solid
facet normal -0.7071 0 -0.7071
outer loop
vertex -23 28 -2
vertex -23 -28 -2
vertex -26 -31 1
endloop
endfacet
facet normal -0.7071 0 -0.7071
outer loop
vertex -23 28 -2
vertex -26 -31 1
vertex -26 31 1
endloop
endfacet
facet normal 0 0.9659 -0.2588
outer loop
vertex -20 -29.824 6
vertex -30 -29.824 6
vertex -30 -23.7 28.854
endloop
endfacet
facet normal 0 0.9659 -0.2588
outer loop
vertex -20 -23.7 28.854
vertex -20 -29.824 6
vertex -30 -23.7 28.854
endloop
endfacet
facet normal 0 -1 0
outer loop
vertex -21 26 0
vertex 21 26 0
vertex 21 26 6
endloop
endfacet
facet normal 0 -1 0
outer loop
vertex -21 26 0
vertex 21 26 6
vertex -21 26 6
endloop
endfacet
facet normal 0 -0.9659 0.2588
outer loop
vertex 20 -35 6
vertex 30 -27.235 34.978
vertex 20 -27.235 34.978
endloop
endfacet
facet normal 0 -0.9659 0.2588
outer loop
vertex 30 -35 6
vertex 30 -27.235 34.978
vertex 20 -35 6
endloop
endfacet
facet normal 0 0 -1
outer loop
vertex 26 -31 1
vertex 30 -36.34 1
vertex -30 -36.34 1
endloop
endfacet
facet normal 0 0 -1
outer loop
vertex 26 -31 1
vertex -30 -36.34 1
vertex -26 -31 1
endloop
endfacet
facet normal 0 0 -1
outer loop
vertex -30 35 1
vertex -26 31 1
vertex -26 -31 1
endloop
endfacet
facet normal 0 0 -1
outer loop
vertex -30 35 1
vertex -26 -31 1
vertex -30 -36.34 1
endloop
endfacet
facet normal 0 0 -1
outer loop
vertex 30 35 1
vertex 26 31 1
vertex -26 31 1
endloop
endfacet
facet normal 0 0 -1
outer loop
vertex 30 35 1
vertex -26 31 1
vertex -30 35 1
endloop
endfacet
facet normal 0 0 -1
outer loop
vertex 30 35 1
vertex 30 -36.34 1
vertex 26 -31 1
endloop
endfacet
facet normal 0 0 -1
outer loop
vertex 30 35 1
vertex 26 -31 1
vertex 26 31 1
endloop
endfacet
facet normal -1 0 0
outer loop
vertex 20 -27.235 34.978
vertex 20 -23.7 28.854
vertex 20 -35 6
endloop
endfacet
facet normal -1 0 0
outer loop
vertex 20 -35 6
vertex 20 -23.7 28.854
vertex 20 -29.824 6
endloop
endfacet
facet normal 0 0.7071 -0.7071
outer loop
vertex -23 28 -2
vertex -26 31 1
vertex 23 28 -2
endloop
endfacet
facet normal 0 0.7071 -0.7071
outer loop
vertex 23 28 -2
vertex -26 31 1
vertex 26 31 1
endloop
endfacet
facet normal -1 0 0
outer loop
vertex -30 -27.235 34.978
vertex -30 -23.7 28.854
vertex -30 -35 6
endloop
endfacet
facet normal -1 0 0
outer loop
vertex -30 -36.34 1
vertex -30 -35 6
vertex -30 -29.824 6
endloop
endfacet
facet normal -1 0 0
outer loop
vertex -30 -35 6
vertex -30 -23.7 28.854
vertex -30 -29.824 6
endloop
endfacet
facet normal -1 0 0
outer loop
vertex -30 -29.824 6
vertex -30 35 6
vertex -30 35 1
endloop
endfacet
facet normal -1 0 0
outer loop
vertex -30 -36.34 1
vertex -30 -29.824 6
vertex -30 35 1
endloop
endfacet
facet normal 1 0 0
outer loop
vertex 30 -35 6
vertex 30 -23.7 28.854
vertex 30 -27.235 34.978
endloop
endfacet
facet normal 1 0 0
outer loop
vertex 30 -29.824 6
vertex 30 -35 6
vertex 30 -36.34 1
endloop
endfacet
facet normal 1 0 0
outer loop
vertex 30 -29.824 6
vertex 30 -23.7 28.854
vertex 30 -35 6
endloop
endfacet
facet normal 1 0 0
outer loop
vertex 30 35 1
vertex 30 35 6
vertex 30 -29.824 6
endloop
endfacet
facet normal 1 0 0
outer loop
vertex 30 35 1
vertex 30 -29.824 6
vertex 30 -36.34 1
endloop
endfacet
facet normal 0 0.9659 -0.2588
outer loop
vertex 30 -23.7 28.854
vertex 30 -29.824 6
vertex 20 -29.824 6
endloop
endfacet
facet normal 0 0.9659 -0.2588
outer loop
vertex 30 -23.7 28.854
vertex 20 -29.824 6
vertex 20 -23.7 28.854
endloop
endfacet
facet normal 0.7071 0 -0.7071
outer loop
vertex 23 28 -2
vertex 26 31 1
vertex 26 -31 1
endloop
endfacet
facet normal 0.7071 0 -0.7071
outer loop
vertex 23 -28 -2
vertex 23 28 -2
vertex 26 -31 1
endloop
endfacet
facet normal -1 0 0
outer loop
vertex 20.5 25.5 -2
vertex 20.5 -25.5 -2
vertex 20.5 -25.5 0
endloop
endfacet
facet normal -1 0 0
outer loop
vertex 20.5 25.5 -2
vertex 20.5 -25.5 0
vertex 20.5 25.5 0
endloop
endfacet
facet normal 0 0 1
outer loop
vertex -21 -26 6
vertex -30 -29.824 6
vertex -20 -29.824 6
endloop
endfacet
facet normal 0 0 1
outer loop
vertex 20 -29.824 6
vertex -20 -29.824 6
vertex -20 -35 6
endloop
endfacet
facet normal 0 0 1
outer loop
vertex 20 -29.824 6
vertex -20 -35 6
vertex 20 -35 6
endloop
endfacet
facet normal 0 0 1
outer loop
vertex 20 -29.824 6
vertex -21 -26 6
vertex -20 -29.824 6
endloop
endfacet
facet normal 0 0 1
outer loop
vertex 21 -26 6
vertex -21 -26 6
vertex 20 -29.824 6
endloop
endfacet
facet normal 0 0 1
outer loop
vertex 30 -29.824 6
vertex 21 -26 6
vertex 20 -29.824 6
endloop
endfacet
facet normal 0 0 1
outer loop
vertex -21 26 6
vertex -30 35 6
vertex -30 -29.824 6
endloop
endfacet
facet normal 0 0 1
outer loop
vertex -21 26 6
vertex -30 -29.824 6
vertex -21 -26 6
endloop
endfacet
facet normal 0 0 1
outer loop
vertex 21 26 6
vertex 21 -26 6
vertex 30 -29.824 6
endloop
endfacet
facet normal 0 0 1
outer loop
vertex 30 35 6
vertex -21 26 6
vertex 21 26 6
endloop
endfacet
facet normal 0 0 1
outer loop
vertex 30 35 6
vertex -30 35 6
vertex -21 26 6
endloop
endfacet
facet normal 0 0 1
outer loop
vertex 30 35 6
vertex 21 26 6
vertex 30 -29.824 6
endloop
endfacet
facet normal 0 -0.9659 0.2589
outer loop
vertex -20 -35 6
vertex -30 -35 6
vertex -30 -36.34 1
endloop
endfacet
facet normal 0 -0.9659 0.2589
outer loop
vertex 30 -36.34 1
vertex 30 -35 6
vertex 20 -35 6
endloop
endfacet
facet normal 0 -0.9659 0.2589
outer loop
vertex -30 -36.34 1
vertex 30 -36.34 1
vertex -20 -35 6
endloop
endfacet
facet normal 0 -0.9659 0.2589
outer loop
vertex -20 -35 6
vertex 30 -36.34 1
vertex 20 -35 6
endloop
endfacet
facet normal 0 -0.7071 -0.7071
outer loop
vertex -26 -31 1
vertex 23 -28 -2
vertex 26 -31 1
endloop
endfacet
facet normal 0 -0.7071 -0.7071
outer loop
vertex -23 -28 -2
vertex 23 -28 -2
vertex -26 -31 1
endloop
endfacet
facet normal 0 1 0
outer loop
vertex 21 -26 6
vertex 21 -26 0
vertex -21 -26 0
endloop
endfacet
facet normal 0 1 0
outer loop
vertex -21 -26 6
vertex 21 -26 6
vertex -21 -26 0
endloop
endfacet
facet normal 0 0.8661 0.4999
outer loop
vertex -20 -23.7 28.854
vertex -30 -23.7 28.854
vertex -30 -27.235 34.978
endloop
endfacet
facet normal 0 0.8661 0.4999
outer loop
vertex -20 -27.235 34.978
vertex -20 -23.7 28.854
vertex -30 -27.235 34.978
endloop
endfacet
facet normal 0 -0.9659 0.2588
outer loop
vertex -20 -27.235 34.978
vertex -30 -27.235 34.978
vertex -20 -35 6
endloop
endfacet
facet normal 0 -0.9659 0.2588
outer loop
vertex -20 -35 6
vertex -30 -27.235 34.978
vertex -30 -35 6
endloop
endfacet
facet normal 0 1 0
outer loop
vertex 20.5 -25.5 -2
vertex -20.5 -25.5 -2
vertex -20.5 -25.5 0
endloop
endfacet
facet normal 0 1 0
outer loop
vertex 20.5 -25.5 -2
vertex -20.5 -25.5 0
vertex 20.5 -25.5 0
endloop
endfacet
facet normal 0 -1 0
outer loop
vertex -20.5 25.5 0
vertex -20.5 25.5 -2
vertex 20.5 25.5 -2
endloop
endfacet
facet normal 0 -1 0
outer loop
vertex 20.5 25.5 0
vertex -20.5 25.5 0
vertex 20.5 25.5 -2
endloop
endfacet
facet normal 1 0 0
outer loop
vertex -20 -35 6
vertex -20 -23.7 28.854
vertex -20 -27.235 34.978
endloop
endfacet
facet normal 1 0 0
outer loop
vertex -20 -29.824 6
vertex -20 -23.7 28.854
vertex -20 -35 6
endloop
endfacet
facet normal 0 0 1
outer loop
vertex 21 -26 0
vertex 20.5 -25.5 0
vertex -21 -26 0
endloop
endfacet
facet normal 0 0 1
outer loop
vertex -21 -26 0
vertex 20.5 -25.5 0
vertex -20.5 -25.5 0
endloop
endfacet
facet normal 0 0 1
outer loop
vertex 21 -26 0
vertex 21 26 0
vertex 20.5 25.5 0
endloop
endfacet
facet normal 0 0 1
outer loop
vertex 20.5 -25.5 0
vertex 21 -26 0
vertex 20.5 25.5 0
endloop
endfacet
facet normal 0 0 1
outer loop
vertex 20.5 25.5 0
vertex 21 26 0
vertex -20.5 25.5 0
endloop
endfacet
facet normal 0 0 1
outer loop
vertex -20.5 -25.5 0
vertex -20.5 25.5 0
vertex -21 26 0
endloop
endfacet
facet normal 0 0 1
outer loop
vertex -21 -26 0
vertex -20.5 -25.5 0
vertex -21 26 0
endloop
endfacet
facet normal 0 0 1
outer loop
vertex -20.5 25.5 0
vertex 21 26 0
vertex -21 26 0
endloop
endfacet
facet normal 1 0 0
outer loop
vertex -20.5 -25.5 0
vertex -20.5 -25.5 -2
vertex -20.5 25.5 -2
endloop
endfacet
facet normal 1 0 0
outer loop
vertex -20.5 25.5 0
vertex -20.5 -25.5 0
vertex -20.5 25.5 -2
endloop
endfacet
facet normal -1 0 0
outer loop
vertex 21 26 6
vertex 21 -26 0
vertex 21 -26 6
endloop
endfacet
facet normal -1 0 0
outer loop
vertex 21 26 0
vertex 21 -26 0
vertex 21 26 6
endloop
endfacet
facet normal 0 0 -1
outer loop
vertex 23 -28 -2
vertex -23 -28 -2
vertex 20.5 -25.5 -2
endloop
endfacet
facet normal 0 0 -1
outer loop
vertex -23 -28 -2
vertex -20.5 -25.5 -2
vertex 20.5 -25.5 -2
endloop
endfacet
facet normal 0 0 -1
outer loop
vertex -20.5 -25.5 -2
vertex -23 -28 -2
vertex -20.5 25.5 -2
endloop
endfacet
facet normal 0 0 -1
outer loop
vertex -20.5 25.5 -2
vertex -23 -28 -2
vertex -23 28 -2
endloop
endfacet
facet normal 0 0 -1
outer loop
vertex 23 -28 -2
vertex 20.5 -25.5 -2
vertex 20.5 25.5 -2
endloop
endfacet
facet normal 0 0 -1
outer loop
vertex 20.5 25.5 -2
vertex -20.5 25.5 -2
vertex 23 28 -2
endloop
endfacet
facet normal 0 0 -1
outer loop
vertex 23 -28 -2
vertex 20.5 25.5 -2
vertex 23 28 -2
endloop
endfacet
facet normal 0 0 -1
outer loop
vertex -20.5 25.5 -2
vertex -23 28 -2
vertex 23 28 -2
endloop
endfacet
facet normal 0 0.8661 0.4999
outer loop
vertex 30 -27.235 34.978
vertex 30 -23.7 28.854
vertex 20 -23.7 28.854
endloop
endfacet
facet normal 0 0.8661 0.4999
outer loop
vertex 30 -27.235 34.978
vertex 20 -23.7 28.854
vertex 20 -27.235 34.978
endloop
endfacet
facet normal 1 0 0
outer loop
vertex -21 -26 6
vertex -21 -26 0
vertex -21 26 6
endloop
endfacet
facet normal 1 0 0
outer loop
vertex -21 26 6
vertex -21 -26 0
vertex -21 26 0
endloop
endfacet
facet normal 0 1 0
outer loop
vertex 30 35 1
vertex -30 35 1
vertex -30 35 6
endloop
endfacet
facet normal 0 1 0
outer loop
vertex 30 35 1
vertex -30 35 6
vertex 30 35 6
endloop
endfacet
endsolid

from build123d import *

# Parameters (mm, degrees)
EXTRUDE_1_DEPTH      = 6
EXTRUDE_1_DEPTH_BACK = 2
SKETCH_1_W           = 60
SKETCH_1_H           = 70
SKETCH_1_W_2         = 41
SKETCH_1_H_2         = 51
SKETCH_2_W           = 42
SKETCH_2_H           = 52
CUT_EXTRUDE_2_DEPTH  = 47.486557197
SKETCH_3_W           = 4
SKETCH_3_H           = 3
CHAMFER_2_SIZE       = 3
EXTRUDE_2_DEPTH      = 10
EXTRUDE_3_DEPTH      = 60


with BuildPart() as part:
    # Эскиз1 → Бобышка-Вытянуть1 (new, two sides: drawn at the far end of the back side and taken through both)
    with BuildSketch(Plane.XY.offset(-EXTRUDE_1_DEPTH_BACK)):
        Rectangle(SKETCH_1_W, SKETCH_1_H)
        Rectangle(SKETCH_1_W_2, SKETCH_1_H_2, mode=Mode.SUBTRACT)
    extrude(amount=EXTRUDE_1_DEPTH + EXTRUDE_1_DEPTH_BACK)

    # Эскиз2 → Вырез-Вытянуть2 (cut, through all)
    with BuildSketch(Plane(origin=(0, 0, 0), x_dir=(-1, 0, 0), z_dir=(0, 0, -1))):
        Rectangle(SKETCH_2_W, SKETCH_2_H)
    extrude(amount=-CUT_EXTRUDE_2_DEPTH, mode=Mode.SUBTRACT)

    # Вырез-По траектории1: sweep along a path in Эскиз4
    with BuildLine(Plane(origin=(0, 0, -2), x_dir=(-1, 0, 0), z_dir=(0, 0, -1))) as sweep_1_path:
        Line((-30, 35), (-30, -35))
        Line((-30, -35), (30, -35))
        Line((30, -35), (30, 35))
        Line((30, 35), (-30, 35))
    # Эскиз3 → Вырез-По траектории1 (sweep, cut)
    with BuildSketch(Plane(origin=(0, -35, 0), x_dir=(-1, 0, 0), z_dir=(0, -1, 0))):
        with Locations((-28, 0.5)):
            Rectangle(SKETCH_3_W, SKETCH_3_H)
    sweep(path=sweep_1_path.line, transition=Transition.RIGHT, mode=Mode.SUBTRACT)

    # Фаска2
    chamfer_2_edges = [part.edges().sort_by_distance(p)[0] for p in [
        (26, 0, -2),
        (0, 31, -2),
        (-26, 0, -2),
        (0, -31, -2),
    ]]
    chamfer(chamfer_2_edges, length=CHAMFER_2_SIZE - 0.0001)  # a hair under: the kernel refuses the full size

    # Эскиз5 → Бобышка-Вытянуть2 (add)
    with BuildSketch(Plane(origin=(30, 0, 0), x_dir=(0, 0, -1), z_dir=(1, 0, 0))):
        Polygon((-34.977774789, -27.235428647), (-6, -35), (-6, -29.823619098), (-28.854050432, -23.699894741), align=None)
    extrude_2 = extrude(amount=-EXTRUDE_2_DEPTH)

    # Зеркальное отражение1: Бобышка-Вытянуть2 across plane
    add(extrude_2.mirror(Plane(origin=(0, 0, 0), x_dir=(0, 0, 1), z_dir=(1, 0, 0))))

    # Эскиз6 → Бобышка-Вытянуть3 (add)
    with BuildSketch(Plane(origin=(30, 0, 0), x_dir=(0, 0, -1), z_dir=(1, 0, 0))):
        Polygon((-6, -35), (-1, -36.339745962), (-1, -35), align=None)
    extrude(amount=-EXTRUDE_3_DEPTH)


solid = part.part
